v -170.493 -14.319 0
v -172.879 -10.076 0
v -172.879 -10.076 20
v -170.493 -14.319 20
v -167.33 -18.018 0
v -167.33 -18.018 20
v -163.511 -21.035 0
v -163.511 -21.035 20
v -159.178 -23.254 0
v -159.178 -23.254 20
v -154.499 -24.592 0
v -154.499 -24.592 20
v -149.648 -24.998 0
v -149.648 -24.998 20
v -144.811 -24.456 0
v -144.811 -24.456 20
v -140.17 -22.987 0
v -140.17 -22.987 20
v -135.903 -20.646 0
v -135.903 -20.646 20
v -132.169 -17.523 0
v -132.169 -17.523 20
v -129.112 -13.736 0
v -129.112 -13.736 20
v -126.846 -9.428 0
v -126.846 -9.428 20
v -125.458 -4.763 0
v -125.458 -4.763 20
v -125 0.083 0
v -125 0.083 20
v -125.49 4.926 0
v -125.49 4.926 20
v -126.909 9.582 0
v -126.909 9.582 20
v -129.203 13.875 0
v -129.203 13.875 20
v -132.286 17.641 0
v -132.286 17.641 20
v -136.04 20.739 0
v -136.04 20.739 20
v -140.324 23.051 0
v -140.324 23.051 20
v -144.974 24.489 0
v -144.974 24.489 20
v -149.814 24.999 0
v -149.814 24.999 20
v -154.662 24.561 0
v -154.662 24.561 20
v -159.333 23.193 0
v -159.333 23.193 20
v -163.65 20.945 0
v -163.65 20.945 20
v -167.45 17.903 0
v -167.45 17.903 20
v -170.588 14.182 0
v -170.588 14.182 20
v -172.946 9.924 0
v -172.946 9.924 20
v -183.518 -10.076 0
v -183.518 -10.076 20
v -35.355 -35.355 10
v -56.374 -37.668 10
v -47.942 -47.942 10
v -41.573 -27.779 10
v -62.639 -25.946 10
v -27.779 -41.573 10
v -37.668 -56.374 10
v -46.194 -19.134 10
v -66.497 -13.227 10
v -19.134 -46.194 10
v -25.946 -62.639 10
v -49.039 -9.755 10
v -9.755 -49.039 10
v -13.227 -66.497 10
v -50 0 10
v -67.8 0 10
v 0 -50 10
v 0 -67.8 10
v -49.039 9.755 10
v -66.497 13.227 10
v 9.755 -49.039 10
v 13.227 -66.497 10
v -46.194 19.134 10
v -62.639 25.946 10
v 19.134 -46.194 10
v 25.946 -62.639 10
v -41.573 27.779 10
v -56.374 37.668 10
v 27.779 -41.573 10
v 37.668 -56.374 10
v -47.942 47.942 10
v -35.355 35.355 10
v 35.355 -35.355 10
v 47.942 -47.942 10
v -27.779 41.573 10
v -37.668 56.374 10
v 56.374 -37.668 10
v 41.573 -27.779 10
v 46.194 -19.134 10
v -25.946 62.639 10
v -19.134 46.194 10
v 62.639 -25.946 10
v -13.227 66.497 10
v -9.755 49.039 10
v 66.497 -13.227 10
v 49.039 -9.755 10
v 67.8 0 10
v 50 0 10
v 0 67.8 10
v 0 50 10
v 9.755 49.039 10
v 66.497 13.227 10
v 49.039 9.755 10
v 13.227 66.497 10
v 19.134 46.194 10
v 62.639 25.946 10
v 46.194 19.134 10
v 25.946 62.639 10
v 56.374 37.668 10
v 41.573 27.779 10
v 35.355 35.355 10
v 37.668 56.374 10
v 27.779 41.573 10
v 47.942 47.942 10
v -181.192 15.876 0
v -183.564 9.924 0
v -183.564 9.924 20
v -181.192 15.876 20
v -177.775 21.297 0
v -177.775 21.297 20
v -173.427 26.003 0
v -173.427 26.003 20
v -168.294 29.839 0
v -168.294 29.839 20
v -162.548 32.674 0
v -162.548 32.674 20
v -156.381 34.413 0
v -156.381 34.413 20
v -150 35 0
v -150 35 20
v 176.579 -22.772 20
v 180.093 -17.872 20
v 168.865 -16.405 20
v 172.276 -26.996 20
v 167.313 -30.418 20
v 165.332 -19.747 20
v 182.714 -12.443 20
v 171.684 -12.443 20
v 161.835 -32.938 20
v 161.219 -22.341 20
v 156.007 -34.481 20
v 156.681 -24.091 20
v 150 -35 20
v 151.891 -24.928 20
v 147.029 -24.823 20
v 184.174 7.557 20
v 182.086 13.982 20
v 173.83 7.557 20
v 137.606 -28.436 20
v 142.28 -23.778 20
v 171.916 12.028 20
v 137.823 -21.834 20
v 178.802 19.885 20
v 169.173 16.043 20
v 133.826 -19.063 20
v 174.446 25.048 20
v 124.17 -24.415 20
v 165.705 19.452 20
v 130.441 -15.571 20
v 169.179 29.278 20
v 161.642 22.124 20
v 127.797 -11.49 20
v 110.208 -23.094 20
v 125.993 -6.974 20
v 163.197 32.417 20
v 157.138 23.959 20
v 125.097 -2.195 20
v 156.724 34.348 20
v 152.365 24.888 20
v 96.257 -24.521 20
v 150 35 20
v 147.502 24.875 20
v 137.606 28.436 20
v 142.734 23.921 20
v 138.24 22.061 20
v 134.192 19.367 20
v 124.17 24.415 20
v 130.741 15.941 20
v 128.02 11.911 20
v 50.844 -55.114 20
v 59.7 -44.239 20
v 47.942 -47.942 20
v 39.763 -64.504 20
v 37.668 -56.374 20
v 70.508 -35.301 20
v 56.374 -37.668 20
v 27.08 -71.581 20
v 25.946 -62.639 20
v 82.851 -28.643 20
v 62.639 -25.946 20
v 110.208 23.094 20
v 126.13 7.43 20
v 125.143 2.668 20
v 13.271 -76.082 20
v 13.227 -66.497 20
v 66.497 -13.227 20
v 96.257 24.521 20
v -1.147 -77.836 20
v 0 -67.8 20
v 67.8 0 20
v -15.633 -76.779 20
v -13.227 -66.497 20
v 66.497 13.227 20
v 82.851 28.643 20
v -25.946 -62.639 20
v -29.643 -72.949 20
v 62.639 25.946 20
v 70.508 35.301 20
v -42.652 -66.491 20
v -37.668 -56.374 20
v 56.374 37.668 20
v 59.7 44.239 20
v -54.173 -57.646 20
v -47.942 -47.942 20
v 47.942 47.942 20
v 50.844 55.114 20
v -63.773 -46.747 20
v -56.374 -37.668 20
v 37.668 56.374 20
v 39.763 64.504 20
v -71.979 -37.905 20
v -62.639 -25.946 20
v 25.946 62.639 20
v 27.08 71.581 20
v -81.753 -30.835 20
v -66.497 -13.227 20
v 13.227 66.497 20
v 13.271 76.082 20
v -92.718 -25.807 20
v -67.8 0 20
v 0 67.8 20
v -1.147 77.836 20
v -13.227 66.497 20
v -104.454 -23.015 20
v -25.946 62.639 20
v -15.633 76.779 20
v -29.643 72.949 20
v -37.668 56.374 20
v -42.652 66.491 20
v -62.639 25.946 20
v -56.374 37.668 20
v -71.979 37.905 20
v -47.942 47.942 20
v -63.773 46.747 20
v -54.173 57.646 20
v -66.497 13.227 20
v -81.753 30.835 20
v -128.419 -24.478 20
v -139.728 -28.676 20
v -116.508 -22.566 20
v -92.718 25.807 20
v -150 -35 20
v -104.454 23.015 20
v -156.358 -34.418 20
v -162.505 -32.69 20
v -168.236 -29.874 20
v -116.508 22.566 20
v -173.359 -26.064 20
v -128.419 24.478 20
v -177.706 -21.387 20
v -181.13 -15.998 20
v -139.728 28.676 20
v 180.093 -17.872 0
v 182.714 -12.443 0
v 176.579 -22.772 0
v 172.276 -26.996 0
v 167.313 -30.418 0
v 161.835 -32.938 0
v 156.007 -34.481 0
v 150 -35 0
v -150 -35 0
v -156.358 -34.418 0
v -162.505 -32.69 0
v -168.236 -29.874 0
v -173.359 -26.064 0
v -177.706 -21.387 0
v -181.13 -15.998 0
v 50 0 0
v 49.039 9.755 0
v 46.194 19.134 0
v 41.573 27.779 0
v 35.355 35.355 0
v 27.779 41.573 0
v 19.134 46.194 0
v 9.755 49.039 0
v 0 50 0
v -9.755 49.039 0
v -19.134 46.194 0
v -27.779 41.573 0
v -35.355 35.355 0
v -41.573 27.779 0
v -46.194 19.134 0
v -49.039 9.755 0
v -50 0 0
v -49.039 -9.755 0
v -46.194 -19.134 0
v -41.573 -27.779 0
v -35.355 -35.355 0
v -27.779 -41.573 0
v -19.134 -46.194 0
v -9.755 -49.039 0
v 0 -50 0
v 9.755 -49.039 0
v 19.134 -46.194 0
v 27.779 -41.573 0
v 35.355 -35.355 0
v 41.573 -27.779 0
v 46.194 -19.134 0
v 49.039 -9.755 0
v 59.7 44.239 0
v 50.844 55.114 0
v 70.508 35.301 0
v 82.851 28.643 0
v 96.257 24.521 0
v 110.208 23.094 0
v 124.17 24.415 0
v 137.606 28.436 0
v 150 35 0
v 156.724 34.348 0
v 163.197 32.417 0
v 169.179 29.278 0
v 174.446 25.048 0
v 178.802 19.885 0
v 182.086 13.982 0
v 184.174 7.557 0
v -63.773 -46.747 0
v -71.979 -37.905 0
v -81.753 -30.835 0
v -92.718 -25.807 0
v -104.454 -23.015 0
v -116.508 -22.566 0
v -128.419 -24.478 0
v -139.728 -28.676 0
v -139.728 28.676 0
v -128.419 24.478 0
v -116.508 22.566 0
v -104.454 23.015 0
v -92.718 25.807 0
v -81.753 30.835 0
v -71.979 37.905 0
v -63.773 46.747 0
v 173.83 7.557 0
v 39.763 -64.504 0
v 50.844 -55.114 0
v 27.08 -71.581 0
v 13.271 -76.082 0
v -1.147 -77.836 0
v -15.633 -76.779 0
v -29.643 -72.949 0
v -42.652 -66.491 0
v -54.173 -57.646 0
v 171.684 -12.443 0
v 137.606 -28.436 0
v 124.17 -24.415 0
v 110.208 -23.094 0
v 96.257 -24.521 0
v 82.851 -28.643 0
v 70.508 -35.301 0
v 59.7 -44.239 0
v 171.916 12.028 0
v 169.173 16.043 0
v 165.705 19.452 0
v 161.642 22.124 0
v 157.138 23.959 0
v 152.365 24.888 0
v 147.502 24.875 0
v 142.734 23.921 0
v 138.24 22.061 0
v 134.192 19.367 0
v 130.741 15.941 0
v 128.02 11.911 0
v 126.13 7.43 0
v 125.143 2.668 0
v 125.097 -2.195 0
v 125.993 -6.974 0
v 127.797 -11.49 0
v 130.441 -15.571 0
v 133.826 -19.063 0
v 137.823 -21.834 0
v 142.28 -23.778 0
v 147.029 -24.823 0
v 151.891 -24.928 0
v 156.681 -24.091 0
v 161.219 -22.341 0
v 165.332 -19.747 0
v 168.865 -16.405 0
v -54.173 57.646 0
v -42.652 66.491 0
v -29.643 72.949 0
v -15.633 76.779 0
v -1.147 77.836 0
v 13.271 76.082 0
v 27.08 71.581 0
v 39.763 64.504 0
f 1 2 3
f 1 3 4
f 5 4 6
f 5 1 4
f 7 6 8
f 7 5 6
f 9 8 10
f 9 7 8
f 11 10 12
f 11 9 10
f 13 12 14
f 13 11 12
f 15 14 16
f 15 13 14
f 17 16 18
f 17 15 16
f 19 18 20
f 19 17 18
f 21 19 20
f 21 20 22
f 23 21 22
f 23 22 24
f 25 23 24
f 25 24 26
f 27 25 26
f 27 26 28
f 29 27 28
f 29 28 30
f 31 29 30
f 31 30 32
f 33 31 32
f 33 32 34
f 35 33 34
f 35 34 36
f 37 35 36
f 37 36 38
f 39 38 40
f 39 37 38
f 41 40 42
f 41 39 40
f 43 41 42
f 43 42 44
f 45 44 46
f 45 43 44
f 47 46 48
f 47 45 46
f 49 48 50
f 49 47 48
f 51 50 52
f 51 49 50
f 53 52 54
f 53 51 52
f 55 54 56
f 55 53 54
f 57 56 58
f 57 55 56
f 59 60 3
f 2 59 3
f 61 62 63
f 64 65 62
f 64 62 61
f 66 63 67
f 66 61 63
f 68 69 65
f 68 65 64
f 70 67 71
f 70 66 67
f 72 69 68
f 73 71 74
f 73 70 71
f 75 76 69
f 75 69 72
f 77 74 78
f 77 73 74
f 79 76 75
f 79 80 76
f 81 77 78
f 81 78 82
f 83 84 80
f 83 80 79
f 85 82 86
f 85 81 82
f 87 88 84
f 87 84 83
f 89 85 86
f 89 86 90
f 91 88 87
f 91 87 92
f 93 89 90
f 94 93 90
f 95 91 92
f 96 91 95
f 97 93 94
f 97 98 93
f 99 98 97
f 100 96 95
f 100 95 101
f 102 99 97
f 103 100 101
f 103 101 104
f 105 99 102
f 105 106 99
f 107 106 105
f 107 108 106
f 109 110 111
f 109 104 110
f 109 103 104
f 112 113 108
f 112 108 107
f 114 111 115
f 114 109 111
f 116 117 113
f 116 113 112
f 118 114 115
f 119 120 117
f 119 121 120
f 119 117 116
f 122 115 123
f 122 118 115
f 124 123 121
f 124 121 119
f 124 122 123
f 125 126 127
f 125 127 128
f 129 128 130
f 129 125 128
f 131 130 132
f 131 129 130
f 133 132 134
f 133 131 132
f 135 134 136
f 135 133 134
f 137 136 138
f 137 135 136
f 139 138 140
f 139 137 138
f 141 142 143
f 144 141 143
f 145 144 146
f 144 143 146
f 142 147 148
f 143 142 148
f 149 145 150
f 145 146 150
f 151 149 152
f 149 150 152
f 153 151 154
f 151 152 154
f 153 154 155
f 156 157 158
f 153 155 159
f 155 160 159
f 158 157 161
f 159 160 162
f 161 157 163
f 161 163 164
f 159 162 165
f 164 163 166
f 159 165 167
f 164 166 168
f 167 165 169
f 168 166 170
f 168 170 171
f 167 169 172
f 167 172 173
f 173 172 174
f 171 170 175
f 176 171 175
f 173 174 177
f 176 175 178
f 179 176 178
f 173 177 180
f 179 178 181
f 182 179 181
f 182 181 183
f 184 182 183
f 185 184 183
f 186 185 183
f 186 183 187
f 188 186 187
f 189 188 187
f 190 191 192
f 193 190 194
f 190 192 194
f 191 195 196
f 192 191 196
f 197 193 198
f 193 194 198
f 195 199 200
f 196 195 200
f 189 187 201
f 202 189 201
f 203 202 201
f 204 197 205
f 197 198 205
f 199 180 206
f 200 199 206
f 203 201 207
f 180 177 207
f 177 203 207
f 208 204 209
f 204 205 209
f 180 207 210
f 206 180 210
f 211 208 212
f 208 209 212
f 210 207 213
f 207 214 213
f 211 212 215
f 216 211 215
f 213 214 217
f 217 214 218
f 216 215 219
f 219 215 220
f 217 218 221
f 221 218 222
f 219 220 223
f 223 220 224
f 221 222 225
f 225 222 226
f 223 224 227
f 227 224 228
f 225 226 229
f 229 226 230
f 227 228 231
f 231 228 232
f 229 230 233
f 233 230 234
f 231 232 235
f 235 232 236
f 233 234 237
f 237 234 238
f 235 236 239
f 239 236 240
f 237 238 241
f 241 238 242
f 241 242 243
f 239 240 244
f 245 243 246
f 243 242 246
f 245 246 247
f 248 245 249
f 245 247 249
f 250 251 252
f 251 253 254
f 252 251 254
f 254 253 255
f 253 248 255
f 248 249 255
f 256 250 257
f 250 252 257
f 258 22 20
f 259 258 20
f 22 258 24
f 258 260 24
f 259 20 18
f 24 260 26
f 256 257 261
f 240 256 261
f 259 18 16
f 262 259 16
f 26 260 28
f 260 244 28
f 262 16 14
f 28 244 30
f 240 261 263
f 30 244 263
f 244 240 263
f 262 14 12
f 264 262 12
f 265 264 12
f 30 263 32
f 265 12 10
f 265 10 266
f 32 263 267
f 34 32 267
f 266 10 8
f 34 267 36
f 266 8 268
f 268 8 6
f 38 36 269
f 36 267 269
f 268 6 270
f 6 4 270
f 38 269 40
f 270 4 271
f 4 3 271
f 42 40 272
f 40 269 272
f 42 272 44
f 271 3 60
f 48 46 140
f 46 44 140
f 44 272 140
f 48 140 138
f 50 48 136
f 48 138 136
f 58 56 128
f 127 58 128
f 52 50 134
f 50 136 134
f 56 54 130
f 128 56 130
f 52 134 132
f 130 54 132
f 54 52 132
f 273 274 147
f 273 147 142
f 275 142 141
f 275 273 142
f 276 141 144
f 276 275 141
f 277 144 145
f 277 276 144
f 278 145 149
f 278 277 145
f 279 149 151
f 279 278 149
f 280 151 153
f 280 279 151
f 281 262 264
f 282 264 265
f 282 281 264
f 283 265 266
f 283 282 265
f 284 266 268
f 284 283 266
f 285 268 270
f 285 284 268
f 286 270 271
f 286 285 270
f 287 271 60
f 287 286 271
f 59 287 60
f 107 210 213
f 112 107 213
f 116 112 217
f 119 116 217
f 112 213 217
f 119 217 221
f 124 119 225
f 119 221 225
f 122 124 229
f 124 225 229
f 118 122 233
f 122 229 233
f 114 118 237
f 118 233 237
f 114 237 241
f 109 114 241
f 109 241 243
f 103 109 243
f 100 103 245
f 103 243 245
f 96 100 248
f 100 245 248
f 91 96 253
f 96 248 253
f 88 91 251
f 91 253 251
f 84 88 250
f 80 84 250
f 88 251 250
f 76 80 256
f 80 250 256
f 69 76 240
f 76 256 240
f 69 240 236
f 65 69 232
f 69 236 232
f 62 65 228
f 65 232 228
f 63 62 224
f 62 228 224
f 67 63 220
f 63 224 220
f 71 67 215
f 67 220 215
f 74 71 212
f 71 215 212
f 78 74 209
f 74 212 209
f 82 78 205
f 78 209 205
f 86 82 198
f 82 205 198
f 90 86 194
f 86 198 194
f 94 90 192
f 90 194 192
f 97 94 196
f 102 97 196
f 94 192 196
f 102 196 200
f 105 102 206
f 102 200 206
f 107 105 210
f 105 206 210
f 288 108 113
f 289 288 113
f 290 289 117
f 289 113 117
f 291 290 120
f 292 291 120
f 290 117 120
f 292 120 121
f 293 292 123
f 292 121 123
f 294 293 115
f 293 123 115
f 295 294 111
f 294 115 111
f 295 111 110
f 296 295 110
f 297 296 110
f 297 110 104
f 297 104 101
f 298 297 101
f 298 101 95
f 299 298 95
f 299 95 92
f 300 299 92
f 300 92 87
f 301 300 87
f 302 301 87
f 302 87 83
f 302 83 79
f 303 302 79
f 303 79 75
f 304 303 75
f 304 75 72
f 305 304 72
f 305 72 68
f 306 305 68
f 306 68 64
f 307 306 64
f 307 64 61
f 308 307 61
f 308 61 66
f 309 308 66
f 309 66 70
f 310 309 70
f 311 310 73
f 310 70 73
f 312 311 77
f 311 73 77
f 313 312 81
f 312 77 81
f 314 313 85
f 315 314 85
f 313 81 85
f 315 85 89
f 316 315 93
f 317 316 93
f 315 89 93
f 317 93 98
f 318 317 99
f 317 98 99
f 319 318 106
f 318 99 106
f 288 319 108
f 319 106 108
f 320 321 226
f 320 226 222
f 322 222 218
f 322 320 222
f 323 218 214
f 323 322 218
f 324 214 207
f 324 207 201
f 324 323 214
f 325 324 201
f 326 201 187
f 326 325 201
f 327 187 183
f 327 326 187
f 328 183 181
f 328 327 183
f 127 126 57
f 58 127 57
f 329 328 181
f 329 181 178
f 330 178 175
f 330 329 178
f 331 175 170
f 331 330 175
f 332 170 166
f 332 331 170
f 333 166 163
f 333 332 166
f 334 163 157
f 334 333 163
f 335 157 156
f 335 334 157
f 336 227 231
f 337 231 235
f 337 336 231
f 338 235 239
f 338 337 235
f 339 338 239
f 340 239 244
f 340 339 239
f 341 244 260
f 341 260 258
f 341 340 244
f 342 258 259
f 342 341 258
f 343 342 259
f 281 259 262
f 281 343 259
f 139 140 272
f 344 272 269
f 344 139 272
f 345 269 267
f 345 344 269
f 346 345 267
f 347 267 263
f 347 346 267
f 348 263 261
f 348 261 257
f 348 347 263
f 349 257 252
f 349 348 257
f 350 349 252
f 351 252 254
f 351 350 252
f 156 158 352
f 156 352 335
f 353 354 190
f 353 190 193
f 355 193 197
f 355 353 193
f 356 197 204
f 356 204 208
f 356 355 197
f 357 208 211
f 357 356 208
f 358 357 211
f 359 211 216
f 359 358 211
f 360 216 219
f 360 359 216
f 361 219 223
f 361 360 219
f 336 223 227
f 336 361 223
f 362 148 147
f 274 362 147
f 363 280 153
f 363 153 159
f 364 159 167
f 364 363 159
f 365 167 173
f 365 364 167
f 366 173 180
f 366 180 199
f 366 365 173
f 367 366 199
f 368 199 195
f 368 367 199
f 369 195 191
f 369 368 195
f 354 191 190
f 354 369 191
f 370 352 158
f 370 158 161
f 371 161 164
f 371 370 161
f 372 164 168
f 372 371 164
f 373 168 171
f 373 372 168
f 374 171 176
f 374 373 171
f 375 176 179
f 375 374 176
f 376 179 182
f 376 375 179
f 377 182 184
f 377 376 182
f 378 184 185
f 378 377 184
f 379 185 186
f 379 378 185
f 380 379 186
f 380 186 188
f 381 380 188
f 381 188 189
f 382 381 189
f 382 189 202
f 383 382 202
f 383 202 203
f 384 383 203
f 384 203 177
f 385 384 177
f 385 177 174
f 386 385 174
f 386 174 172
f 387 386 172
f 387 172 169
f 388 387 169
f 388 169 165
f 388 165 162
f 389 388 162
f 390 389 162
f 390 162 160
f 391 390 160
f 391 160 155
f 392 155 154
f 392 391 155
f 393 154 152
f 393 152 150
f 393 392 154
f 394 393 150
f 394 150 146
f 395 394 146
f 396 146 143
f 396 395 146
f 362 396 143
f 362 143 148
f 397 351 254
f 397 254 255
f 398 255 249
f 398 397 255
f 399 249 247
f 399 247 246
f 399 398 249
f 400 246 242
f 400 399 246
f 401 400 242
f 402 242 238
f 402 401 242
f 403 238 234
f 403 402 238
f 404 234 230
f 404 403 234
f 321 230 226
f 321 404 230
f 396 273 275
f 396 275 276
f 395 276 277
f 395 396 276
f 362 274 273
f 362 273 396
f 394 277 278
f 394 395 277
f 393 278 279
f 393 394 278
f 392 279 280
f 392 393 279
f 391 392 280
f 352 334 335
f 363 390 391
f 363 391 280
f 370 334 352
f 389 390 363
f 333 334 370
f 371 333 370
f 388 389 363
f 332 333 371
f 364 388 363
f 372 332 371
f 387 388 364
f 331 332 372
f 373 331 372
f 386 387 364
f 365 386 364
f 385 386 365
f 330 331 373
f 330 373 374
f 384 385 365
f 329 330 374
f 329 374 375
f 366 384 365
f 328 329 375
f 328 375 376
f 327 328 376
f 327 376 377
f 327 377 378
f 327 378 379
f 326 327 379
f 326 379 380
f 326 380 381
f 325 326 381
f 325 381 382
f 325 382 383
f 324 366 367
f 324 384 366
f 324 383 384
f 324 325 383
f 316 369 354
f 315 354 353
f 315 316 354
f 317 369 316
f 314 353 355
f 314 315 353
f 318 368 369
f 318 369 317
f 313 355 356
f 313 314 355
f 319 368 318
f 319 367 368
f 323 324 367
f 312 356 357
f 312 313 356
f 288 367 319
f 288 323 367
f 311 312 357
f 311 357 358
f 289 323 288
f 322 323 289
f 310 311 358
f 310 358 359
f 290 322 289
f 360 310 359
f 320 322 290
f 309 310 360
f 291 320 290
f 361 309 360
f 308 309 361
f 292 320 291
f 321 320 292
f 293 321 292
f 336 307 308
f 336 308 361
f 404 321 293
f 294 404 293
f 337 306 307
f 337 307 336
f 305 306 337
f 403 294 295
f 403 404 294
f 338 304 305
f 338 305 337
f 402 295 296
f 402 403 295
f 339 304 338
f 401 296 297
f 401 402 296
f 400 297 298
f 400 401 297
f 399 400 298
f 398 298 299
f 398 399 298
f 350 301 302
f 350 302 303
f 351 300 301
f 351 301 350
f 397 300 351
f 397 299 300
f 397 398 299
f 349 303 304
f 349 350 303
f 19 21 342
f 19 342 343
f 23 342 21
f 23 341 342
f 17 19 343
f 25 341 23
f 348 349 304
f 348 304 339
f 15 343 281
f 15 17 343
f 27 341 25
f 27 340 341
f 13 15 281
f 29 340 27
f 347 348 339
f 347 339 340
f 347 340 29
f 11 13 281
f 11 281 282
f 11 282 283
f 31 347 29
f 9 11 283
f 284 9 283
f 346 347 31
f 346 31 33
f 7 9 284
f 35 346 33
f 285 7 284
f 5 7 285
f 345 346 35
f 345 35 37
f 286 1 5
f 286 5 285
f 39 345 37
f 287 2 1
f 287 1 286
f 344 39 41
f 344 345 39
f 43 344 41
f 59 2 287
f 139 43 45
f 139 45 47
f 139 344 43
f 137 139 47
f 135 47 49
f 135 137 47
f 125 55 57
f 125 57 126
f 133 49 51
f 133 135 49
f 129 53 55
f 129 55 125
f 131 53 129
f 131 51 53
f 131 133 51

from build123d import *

# Parameters (mm, degrees)
SKETCH1_R           = 67.8
SKETCH1_R_2         = 50
BOSS_EXTRUDE1_DEPTH = 10
SKETCH2_R           = 25
BOSS_EXTRUDE2_DEPTH = 20
SKETCH3_R           = 67.8
CUT_EXTRUDE1_DEPTH  = 10
SKETCH4_R           = 50
CUT_EXTRUDE2_DEPTH  = 11
SKETCH5_W           = 15.080994576
SKETCH5_H           = 20
CUT_EXTRUDE3_DEPTH  = 21
SKETCH6_W           = 19.646297403
SKETCH6_H           = 20
CUT_EXTRUDE4_DEPTH  = 21


with BuildPart() as part:
    # Sketch1 → Boss-Extrude1 (new body)
    with BuildSketch(Plane.XY):
        Circle(SKETCH1_R)
        Circle(SKETCH1_R_2, mode=Mode.SUBTRACT)
    extrude(amount=BOSS_EXTRUDE1_DEPTH)

    # Sketch2 → Boss-Extrude2 (add)
    with BuildSketch(Plane.XY):
        with BuildLine():
            ThreePointArc((-63.772719488, 46.746532272), (-8.415408503, 77.65917808), (50.844425579, 55.113765796))
            ThreePointArc((50.844425579, 55.113765796), (96.256515498, 24.521091043), (150, 35))
            ThreePointArc((150, 35), (185, 0), (150, -35))
            ThreePointArc((150, -35), (96.256515498, -24.521091043), (50.844425579, -55.113765796))
            ThreePointArc((50.844425579, -55.113765796), (-8.415408503, -77.65917808), (-63.772719488, -46.746532272))
            ThreePointArc((-63.772719488, -46.746532272), (-104.453573255, -23.015011619), (-150, -35))
            ThreePointArc((-150, -35), (-185, 0), (-150, 35))
            ThreePointArc((-150, 35), (-104.453573255, 23.015011619), (-63.772719488, 46.746532272))
        make_face()
        with Locations((-150, 0)):
            Circle(SKETCH2_R, mode=Mode.SUBTRACT)
        with Locations((150, 0)):
            Circle(SKETCH2_R, mode=Mode.SUBTRACT)
    extrude(amount=BOSS_EXTRUDE2_DEPTH)

    # Sketch3 → Cut-Extrude1 (cut)
    with BuildSketch(Plane.XY.offset(20)):
        Circle(SKETCH3_R)
    extrude(amount=-CUT_EXTRUDE1_DEPTH, mode=Mode.SUBTRACT)

    # Sketch4 → Cut-Extrude2 (cut, through all)
    with BuildSketch(Plane.XY.offset(10)):
        Circle(SKETCH4_R)
    extrude(amount=-CUT_EXTRUDE2_DEPTH, mode=Mode.SUBTRACT)

    # Sketch5 → Cut-Extrude3 (cut, through all)
    with BuildSketch(Plane.XY.offset(20)):
        with Locations((-180.419979471, -0.076174623)):
            Rectangle(SKETCH5_W, SKETCH5_H)
    extrude(amount=-CUT_EXTRUDE3_DEPTH, mode=Mode.SUBTRACT)

    # Sketch6 → Cut-Extrude4 (cut, through all)
    with BuildSketch(Plane.XY.offset(20)):
        with Locations((179.499488159, -2.442655022)):
            Rectangle(SKETCH6_W, SKETCH6_H)
    extrude(amount=-CUT_EXTRUDE4_DEPTH, mode=Mode.SUBTRACT)


solid = part.part
